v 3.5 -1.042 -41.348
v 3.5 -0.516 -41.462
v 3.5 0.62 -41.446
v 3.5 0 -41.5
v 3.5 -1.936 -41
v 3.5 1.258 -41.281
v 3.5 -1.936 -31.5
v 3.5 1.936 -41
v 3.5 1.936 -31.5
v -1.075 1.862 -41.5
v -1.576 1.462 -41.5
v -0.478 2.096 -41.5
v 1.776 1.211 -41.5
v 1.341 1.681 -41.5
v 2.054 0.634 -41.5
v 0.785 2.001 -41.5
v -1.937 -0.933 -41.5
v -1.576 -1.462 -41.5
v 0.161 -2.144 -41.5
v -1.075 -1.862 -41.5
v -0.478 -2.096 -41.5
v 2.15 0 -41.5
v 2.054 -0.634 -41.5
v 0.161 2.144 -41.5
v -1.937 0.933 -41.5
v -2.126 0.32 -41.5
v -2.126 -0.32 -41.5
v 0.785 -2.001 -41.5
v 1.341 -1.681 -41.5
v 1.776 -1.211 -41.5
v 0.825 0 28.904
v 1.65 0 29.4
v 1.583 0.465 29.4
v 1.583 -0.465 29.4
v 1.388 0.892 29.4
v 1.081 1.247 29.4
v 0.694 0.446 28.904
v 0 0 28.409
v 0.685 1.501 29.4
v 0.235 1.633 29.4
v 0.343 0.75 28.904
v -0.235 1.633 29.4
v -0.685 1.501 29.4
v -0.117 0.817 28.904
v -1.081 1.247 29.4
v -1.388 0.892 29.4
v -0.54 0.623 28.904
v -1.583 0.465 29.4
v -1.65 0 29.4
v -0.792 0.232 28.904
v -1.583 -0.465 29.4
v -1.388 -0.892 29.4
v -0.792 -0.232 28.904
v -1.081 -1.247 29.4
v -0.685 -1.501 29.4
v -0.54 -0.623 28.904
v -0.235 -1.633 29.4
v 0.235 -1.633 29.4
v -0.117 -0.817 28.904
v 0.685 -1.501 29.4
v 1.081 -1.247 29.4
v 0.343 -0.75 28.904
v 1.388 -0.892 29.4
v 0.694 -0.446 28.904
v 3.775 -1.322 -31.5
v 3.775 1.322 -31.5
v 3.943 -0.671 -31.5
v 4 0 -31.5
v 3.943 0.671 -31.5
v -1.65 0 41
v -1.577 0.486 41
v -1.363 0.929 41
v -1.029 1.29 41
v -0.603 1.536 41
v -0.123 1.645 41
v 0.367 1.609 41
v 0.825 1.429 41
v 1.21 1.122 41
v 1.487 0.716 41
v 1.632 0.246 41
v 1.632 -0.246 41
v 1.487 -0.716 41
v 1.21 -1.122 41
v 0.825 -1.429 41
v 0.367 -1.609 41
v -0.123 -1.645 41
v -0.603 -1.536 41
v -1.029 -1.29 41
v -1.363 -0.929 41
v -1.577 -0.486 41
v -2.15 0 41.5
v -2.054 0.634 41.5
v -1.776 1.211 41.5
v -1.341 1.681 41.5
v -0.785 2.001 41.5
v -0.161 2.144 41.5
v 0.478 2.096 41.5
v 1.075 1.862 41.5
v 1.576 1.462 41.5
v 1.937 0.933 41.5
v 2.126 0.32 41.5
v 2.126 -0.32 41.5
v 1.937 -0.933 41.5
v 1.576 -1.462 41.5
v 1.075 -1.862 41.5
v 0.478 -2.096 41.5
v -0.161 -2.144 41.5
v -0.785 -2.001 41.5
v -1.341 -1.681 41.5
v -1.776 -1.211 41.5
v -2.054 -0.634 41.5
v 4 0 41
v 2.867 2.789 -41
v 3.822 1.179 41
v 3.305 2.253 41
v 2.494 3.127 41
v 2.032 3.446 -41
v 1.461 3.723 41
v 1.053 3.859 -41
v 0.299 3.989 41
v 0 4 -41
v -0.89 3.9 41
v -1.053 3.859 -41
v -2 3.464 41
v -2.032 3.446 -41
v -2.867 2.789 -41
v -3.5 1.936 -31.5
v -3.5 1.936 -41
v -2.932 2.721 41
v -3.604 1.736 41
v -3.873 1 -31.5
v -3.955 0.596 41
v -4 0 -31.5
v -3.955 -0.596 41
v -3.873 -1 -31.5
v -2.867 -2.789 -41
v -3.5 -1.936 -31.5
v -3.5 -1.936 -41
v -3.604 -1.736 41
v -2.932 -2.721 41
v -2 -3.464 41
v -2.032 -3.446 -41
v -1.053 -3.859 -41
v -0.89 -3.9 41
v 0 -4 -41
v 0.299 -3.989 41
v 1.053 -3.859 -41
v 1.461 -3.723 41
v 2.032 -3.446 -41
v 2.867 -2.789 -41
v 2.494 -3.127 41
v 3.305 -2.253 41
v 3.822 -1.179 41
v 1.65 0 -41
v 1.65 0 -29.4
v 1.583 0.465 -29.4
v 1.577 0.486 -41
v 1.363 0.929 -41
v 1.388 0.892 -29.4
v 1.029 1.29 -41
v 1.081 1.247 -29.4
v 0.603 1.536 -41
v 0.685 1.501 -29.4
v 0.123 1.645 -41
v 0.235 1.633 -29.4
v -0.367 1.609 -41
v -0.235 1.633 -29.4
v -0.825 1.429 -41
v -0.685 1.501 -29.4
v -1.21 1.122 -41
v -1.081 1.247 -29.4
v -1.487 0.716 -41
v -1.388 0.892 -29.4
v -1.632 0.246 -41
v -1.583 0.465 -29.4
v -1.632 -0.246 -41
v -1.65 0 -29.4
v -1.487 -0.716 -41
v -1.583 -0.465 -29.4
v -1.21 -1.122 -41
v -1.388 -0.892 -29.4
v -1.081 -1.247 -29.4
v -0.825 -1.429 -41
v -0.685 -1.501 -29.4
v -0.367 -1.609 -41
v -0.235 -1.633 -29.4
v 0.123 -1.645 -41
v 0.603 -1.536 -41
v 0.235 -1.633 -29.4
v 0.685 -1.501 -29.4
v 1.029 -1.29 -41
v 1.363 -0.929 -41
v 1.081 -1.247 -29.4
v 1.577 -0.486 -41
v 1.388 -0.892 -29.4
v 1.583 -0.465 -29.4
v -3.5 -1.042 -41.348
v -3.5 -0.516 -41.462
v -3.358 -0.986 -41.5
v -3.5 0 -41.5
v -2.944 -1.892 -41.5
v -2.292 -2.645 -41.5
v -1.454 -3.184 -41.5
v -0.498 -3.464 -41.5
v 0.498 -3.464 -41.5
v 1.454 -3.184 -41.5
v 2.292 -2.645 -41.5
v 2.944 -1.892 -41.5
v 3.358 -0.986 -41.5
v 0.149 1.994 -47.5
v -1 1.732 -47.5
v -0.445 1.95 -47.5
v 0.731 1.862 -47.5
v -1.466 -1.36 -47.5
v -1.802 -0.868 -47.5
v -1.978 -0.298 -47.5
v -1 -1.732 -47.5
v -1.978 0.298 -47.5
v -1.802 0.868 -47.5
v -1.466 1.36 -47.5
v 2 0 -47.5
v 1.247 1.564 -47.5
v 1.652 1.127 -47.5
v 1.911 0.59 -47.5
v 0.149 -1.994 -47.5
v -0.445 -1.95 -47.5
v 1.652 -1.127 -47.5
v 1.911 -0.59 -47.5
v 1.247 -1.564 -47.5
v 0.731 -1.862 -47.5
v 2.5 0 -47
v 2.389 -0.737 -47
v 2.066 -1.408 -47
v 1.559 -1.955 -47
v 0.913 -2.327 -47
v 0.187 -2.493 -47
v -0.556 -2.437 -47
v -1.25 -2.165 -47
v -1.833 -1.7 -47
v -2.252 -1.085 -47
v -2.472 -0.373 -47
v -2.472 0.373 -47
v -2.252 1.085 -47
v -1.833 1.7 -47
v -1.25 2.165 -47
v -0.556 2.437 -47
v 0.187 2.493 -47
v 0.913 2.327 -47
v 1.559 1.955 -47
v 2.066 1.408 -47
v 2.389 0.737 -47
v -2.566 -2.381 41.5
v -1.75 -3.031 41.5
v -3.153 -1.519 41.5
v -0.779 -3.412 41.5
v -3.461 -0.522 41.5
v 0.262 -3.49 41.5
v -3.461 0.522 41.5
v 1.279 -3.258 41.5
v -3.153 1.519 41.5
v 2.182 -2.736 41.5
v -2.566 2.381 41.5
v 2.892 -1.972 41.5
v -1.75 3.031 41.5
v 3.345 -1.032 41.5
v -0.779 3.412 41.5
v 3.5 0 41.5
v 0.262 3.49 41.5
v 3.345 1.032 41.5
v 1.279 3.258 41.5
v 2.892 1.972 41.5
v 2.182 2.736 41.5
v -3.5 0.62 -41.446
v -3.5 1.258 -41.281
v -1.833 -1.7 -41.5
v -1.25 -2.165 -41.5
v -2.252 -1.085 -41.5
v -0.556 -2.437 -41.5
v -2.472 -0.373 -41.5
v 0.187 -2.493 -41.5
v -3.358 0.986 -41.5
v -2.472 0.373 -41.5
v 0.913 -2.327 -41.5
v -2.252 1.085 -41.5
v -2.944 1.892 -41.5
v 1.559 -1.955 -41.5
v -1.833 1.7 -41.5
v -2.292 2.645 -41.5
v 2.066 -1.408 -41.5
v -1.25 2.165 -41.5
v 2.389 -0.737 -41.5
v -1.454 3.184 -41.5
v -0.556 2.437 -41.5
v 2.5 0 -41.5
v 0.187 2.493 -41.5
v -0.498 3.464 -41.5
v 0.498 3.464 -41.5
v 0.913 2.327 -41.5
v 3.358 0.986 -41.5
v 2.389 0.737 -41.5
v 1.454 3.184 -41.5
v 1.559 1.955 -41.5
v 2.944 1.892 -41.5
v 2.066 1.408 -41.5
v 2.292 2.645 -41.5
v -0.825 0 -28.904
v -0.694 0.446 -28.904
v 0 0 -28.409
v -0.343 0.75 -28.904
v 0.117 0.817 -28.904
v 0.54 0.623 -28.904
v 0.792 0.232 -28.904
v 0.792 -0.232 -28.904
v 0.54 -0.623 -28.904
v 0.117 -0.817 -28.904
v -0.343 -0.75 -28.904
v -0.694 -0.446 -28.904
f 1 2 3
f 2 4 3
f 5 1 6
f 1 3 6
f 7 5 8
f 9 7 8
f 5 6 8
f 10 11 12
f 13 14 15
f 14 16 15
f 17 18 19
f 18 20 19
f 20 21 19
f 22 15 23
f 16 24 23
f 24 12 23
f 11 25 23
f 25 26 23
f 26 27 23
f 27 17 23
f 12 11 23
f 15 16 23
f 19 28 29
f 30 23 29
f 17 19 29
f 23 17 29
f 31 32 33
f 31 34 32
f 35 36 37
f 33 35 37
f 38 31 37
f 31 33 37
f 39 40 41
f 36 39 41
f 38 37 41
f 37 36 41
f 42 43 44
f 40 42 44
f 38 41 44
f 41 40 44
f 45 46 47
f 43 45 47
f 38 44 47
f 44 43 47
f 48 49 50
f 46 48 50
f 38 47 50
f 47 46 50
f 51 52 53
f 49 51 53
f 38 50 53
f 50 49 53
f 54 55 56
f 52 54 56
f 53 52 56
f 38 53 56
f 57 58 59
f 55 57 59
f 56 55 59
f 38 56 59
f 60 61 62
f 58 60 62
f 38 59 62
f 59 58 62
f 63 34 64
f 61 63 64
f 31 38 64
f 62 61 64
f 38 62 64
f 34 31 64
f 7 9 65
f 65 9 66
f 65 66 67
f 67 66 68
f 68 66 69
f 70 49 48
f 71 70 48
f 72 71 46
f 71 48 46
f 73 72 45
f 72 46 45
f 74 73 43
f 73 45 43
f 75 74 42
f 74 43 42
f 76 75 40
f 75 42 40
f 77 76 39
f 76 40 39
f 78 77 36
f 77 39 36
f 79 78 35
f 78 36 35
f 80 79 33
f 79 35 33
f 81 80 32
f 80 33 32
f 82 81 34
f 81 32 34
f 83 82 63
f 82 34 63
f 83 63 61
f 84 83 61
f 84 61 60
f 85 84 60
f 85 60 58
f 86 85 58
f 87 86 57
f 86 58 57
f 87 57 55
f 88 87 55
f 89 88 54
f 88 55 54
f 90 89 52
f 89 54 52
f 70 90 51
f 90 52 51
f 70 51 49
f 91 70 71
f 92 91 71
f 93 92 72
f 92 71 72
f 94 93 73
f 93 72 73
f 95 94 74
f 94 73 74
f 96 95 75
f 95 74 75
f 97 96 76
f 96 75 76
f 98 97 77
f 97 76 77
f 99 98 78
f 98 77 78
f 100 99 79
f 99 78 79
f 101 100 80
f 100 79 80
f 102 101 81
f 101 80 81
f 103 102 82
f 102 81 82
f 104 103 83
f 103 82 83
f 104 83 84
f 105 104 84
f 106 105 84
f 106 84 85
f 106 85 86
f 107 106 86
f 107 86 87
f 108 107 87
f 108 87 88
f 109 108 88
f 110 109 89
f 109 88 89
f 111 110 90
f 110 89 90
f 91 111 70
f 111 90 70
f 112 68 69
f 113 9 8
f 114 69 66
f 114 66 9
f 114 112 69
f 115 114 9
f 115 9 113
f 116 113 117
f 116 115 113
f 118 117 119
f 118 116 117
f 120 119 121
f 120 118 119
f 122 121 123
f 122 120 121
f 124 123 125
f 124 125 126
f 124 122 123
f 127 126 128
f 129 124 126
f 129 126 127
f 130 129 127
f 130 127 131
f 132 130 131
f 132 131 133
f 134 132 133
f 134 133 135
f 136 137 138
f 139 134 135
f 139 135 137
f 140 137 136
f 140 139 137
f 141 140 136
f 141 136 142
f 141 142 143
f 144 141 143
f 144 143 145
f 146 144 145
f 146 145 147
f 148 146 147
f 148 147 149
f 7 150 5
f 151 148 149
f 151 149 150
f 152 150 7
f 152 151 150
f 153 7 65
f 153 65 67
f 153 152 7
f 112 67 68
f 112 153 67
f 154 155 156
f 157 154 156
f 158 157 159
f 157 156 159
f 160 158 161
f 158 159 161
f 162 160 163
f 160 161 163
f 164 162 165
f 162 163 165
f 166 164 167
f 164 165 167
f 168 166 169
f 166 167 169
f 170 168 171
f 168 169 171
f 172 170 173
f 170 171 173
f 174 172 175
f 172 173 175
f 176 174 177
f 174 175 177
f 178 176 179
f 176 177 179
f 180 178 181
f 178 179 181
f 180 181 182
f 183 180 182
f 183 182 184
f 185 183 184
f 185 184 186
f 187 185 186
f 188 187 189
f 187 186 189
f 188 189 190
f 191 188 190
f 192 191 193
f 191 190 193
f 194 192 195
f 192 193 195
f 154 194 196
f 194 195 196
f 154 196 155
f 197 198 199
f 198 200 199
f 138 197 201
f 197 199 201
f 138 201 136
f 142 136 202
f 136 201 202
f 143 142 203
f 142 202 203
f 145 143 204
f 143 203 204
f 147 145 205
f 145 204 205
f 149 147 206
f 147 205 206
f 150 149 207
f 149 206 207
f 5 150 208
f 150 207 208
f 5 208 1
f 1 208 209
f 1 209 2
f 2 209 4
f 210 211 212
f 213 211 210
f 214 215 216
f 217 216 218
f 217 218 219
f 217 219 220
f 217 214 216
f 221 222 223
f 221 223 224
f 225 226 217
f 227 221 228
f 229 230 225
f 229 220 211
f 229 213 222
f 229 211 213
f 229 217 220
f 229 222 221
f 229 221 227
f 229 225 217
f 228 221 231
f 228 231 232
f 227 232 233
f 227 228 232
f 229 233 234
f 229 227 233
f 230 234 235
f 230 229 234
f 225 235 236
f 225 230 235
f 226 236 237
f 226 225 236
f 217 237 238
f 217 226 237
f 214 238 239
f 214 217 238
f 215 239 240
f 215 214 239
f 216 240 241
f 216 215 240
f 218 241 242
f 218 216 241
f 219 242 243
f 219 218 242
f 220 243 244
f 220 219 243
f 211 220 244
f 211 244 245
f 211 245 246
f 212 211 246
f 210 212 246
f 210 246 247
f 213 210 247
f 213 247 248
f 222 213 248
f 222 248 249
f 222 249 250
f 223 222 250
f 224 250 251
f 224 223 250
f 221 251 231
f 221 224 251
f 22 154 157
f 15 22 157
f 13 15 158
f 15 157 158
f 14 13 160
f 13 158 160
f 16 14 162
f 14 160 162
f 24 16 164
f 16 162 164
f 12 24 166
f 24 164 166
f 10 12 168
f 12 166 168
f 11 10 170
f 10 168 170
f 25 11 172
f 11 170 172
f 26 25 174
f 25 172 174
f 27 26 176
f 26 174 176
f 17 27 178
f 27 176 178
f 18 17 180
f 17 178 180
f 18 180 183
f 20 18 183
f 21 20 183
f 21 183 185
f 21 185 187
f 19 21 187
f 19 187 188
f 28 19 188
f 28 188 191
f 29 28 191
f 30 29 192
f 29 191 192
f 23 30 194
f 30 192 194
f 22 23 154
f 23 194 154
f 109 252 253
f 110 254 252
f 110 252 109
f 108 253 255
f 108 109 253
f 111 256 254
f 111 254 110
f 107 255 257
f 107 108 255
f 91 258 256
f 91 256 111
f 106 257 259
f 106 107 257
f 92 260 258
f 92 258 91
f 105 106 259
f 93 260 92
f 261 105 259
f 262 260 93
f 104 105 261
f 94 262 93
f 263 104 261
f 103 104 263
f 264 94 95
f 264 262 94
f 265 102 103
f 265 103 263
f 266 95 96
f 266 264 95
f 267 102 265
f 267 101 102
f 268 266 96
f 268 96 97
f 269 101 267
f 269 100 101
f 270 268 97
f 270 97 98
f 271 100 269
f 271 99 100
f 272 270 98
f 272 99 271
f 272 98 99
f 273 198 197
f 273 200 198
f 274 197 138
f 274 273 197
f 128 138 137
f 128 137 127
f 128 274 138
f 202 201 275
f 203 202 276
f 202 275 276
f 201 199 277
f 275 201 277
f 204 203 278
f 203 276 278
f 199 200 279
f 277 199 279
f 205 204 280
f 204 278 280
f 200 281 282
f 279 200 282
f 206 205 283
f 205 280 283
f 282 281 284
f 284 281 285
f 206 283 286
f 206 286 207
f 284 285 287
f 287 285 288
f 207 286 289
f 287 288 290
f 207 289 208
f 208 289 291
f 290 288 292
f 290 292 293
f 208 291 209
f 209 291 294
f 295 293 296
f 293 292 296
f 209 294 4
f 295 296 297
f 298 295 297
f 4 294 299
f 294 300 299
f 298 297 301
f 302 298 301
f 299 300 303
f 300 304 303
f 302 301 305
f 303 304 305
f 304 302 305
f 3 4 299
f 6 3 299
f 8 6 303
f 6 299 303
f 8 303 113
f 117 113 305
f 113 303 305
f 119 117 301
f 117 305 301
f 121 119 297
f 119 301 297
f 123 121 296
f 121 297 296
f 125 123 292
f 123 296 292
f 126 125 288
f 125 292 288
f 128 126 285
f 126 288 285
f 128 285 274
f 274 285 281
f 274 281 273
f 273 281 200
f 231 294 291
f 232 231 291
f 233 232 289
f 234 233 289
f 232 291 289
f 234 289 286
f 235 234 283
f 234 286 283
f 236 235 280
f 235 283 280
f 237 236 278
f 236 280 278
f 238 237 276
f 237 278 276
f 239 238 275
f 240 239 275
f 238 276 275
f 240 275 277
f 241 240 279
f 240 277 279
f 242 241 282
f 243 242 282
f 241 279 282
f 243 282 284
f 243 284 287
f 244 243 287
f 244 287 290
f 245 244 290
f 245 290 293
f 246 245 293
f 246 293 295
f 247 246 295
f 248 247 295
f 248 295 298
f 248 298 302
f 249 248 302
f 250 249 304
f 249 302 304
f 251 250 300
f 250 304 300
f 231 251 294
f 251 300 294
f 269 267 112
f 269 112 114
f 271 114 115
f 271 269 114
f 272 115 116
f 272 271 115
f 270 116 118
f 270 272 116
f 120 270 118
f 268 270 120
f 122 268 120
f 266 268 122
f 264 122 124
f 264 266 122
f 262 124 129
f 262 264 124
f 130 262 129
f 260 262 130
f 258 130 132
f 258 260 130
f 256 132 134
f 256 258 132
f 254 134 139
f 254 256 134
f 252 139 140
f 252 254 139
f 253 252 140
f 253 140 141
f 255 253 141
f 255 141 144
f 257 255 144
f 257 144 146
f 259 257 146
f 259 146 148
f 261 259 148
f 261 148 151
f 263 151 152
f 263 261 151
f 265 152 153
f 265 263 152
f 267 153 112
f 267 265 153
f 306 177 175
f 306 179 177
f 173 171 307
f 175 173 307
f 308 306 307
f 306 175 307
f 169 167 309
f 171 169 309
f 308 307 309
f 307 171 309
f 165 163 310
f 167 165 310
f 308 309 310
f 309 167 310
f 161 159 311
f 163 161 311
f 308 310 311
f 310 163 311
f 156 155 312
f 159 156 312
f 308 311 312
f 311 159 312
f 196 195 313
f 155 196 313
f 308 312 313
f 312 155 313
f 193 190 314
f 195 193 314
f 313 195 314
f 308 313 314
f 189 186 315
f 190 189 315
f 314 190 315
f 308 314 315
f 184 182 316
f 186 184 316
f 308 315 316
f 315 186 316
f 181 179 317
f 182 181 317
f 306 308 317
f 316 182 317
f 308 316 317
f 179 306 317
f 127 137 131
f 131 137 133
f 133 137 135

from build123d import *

# Parameters (mm, degrees)
SKETCH_1_R                       = 4
EXTRUDE_1_DEPTH                  = 41.5
HOLE_WIZARD_M4_1_D               = 3.3
HOLE_WIZARD_M4_1_DEPTH           = 12.1
HOLE_WIZARD_M4_1_TIP             = 0.991420021
HOLE_WIZARD_M4_1_ON_FACE_2_D     = 3.3
HOLE_WIZARD_M4_1_ON_FACE_2_DEPTH = 12.1
HOLE_WIZARD_M4_1_ON_FACE_2_TIP   = 0.991420021
CHAMFER_1_SIZE                   = 0.5
SKETCH_3_R                       = 2.5
EXTRUDE_1_2_DEPTH                = 6
CHAMFER_2_SIZE                   = 0.5
SKETCH_4_OUTSIDE_W               = 27.944
SKETCH_4_OUTSIDE_H               = 27.944
SKETCH_4_OUTSIDE_W_2             = 7
SKETCH_4_OUTSIDE_H_2             = 10.356925226
CUT_EXTRUDE_1_DEPTH              = 10


with BuildPart() as part:
    # 草图1 → Extrude 1 (new, symmetric)
    with BuildSketch(Plane.XY):
        Circle(SKETCH_1_R)
    extrude(amount=EXTRUDE_1_DEPTH, both=True)

    # M4 螺纹孔1
    with Locations(Plane.XY.offset(41.5)):
        with Locations((0, 0)):
            Hole(HOLE_WIZARD_M4_1_D / 2, depth=HOLE_WIZARD_M4_1_DEPTH)
            with Locations((0, 0, -(HOLE_WIZARD_M4_1_DEPTH + HOLE_WIZARD_M4_1_TIP / 2))):  # 118° drill point
                Cone(0, HOLE_WIZARD_M4_1_D / 2, HOLE_WIZARD_M4_1_TIP, mode=Mode.SUBTRACT)

    # M4 螺纹孔1 on face 2
    with Locations(Plane(origin=(0, 0, -41.5), x_dir=(-1, 0, 0), z_dir=(0, 0, -1))):
        with Locations((0, 0)):
            Hole(HOLE_WIZARD_M4_1_ON_FACE_2_D / 2, depth=HOLE_WIZARD_M4_1_ON_FACE_2_DEPTH)
            with Locations((0, 0, -(HOLE_WIZARD_M4_1_ON_FACE_2_DEPTH + HOLE_WIZARD_M4_1_ON_FACE_2_TIP / 2))):  # 118° drill point
                Cone(0, HOLE_WIZARD_M4_1_ON_FACE_2_D / 2, HOLE_WIZARD_M4_1_ON_FACE_2_TIP, mode=Mode.SUBTRACT)

    # 倒角1
    chamfer_1_edges = [part.edges().sort_by_distance(p)[0] for p in [
        (-4, 0, -41.5),
        (-4, 0, 41.5),
        (-1.65, 0, -41.5),
        (1.65, 0, 41.5),
    ]]
    chamfer(chamfer_1_edges, length=CHAMFER_1_SIZE)

    # 草图3 → Extrude 1 2 (add)
    with BuildSketch(Plane(origin=(0, 0, -41.5), x_dir=(-1, 0, 0), z_dir=(0, 0, -1))):
        with Locations(Location((0, 0, 0), (0, 0, 180))):
            Circle(SKETCH_3_R)
    extrude(amount=EXTRUDE_1_2_DEPTH)

    # 倒角2
    chamfer_2_edges = [part.edges().sort_by_distance(p)[0] for p in [
        (-2.5, 0, -47.5),
    ]]
    chamfer(chamfer_2_edges, length=CHAMFER_2_SIZE)

    # 草图4 outside → 切除-拉伸1 (cut)
    with BuildSketch(Plane(origin=(0, 0, -41.5), x_dir=(-1, 0, 0), z_dir=(0, 0, -1))):
        Rectangle(SKETCH_4_OUTSIDE_W, SKETCH_4_OUTSIDE_H)
        Rectangle(SKETCH_4_OUTSIDE_W_2, SKETCH_4_OUTSIDE_H_2, mode=Mode.SUBTRACT)
    extrude(amount=-CUT_EXTRUDE_1_DEPTH, mode=Mode.SUBTRACT)


solid = part.part
